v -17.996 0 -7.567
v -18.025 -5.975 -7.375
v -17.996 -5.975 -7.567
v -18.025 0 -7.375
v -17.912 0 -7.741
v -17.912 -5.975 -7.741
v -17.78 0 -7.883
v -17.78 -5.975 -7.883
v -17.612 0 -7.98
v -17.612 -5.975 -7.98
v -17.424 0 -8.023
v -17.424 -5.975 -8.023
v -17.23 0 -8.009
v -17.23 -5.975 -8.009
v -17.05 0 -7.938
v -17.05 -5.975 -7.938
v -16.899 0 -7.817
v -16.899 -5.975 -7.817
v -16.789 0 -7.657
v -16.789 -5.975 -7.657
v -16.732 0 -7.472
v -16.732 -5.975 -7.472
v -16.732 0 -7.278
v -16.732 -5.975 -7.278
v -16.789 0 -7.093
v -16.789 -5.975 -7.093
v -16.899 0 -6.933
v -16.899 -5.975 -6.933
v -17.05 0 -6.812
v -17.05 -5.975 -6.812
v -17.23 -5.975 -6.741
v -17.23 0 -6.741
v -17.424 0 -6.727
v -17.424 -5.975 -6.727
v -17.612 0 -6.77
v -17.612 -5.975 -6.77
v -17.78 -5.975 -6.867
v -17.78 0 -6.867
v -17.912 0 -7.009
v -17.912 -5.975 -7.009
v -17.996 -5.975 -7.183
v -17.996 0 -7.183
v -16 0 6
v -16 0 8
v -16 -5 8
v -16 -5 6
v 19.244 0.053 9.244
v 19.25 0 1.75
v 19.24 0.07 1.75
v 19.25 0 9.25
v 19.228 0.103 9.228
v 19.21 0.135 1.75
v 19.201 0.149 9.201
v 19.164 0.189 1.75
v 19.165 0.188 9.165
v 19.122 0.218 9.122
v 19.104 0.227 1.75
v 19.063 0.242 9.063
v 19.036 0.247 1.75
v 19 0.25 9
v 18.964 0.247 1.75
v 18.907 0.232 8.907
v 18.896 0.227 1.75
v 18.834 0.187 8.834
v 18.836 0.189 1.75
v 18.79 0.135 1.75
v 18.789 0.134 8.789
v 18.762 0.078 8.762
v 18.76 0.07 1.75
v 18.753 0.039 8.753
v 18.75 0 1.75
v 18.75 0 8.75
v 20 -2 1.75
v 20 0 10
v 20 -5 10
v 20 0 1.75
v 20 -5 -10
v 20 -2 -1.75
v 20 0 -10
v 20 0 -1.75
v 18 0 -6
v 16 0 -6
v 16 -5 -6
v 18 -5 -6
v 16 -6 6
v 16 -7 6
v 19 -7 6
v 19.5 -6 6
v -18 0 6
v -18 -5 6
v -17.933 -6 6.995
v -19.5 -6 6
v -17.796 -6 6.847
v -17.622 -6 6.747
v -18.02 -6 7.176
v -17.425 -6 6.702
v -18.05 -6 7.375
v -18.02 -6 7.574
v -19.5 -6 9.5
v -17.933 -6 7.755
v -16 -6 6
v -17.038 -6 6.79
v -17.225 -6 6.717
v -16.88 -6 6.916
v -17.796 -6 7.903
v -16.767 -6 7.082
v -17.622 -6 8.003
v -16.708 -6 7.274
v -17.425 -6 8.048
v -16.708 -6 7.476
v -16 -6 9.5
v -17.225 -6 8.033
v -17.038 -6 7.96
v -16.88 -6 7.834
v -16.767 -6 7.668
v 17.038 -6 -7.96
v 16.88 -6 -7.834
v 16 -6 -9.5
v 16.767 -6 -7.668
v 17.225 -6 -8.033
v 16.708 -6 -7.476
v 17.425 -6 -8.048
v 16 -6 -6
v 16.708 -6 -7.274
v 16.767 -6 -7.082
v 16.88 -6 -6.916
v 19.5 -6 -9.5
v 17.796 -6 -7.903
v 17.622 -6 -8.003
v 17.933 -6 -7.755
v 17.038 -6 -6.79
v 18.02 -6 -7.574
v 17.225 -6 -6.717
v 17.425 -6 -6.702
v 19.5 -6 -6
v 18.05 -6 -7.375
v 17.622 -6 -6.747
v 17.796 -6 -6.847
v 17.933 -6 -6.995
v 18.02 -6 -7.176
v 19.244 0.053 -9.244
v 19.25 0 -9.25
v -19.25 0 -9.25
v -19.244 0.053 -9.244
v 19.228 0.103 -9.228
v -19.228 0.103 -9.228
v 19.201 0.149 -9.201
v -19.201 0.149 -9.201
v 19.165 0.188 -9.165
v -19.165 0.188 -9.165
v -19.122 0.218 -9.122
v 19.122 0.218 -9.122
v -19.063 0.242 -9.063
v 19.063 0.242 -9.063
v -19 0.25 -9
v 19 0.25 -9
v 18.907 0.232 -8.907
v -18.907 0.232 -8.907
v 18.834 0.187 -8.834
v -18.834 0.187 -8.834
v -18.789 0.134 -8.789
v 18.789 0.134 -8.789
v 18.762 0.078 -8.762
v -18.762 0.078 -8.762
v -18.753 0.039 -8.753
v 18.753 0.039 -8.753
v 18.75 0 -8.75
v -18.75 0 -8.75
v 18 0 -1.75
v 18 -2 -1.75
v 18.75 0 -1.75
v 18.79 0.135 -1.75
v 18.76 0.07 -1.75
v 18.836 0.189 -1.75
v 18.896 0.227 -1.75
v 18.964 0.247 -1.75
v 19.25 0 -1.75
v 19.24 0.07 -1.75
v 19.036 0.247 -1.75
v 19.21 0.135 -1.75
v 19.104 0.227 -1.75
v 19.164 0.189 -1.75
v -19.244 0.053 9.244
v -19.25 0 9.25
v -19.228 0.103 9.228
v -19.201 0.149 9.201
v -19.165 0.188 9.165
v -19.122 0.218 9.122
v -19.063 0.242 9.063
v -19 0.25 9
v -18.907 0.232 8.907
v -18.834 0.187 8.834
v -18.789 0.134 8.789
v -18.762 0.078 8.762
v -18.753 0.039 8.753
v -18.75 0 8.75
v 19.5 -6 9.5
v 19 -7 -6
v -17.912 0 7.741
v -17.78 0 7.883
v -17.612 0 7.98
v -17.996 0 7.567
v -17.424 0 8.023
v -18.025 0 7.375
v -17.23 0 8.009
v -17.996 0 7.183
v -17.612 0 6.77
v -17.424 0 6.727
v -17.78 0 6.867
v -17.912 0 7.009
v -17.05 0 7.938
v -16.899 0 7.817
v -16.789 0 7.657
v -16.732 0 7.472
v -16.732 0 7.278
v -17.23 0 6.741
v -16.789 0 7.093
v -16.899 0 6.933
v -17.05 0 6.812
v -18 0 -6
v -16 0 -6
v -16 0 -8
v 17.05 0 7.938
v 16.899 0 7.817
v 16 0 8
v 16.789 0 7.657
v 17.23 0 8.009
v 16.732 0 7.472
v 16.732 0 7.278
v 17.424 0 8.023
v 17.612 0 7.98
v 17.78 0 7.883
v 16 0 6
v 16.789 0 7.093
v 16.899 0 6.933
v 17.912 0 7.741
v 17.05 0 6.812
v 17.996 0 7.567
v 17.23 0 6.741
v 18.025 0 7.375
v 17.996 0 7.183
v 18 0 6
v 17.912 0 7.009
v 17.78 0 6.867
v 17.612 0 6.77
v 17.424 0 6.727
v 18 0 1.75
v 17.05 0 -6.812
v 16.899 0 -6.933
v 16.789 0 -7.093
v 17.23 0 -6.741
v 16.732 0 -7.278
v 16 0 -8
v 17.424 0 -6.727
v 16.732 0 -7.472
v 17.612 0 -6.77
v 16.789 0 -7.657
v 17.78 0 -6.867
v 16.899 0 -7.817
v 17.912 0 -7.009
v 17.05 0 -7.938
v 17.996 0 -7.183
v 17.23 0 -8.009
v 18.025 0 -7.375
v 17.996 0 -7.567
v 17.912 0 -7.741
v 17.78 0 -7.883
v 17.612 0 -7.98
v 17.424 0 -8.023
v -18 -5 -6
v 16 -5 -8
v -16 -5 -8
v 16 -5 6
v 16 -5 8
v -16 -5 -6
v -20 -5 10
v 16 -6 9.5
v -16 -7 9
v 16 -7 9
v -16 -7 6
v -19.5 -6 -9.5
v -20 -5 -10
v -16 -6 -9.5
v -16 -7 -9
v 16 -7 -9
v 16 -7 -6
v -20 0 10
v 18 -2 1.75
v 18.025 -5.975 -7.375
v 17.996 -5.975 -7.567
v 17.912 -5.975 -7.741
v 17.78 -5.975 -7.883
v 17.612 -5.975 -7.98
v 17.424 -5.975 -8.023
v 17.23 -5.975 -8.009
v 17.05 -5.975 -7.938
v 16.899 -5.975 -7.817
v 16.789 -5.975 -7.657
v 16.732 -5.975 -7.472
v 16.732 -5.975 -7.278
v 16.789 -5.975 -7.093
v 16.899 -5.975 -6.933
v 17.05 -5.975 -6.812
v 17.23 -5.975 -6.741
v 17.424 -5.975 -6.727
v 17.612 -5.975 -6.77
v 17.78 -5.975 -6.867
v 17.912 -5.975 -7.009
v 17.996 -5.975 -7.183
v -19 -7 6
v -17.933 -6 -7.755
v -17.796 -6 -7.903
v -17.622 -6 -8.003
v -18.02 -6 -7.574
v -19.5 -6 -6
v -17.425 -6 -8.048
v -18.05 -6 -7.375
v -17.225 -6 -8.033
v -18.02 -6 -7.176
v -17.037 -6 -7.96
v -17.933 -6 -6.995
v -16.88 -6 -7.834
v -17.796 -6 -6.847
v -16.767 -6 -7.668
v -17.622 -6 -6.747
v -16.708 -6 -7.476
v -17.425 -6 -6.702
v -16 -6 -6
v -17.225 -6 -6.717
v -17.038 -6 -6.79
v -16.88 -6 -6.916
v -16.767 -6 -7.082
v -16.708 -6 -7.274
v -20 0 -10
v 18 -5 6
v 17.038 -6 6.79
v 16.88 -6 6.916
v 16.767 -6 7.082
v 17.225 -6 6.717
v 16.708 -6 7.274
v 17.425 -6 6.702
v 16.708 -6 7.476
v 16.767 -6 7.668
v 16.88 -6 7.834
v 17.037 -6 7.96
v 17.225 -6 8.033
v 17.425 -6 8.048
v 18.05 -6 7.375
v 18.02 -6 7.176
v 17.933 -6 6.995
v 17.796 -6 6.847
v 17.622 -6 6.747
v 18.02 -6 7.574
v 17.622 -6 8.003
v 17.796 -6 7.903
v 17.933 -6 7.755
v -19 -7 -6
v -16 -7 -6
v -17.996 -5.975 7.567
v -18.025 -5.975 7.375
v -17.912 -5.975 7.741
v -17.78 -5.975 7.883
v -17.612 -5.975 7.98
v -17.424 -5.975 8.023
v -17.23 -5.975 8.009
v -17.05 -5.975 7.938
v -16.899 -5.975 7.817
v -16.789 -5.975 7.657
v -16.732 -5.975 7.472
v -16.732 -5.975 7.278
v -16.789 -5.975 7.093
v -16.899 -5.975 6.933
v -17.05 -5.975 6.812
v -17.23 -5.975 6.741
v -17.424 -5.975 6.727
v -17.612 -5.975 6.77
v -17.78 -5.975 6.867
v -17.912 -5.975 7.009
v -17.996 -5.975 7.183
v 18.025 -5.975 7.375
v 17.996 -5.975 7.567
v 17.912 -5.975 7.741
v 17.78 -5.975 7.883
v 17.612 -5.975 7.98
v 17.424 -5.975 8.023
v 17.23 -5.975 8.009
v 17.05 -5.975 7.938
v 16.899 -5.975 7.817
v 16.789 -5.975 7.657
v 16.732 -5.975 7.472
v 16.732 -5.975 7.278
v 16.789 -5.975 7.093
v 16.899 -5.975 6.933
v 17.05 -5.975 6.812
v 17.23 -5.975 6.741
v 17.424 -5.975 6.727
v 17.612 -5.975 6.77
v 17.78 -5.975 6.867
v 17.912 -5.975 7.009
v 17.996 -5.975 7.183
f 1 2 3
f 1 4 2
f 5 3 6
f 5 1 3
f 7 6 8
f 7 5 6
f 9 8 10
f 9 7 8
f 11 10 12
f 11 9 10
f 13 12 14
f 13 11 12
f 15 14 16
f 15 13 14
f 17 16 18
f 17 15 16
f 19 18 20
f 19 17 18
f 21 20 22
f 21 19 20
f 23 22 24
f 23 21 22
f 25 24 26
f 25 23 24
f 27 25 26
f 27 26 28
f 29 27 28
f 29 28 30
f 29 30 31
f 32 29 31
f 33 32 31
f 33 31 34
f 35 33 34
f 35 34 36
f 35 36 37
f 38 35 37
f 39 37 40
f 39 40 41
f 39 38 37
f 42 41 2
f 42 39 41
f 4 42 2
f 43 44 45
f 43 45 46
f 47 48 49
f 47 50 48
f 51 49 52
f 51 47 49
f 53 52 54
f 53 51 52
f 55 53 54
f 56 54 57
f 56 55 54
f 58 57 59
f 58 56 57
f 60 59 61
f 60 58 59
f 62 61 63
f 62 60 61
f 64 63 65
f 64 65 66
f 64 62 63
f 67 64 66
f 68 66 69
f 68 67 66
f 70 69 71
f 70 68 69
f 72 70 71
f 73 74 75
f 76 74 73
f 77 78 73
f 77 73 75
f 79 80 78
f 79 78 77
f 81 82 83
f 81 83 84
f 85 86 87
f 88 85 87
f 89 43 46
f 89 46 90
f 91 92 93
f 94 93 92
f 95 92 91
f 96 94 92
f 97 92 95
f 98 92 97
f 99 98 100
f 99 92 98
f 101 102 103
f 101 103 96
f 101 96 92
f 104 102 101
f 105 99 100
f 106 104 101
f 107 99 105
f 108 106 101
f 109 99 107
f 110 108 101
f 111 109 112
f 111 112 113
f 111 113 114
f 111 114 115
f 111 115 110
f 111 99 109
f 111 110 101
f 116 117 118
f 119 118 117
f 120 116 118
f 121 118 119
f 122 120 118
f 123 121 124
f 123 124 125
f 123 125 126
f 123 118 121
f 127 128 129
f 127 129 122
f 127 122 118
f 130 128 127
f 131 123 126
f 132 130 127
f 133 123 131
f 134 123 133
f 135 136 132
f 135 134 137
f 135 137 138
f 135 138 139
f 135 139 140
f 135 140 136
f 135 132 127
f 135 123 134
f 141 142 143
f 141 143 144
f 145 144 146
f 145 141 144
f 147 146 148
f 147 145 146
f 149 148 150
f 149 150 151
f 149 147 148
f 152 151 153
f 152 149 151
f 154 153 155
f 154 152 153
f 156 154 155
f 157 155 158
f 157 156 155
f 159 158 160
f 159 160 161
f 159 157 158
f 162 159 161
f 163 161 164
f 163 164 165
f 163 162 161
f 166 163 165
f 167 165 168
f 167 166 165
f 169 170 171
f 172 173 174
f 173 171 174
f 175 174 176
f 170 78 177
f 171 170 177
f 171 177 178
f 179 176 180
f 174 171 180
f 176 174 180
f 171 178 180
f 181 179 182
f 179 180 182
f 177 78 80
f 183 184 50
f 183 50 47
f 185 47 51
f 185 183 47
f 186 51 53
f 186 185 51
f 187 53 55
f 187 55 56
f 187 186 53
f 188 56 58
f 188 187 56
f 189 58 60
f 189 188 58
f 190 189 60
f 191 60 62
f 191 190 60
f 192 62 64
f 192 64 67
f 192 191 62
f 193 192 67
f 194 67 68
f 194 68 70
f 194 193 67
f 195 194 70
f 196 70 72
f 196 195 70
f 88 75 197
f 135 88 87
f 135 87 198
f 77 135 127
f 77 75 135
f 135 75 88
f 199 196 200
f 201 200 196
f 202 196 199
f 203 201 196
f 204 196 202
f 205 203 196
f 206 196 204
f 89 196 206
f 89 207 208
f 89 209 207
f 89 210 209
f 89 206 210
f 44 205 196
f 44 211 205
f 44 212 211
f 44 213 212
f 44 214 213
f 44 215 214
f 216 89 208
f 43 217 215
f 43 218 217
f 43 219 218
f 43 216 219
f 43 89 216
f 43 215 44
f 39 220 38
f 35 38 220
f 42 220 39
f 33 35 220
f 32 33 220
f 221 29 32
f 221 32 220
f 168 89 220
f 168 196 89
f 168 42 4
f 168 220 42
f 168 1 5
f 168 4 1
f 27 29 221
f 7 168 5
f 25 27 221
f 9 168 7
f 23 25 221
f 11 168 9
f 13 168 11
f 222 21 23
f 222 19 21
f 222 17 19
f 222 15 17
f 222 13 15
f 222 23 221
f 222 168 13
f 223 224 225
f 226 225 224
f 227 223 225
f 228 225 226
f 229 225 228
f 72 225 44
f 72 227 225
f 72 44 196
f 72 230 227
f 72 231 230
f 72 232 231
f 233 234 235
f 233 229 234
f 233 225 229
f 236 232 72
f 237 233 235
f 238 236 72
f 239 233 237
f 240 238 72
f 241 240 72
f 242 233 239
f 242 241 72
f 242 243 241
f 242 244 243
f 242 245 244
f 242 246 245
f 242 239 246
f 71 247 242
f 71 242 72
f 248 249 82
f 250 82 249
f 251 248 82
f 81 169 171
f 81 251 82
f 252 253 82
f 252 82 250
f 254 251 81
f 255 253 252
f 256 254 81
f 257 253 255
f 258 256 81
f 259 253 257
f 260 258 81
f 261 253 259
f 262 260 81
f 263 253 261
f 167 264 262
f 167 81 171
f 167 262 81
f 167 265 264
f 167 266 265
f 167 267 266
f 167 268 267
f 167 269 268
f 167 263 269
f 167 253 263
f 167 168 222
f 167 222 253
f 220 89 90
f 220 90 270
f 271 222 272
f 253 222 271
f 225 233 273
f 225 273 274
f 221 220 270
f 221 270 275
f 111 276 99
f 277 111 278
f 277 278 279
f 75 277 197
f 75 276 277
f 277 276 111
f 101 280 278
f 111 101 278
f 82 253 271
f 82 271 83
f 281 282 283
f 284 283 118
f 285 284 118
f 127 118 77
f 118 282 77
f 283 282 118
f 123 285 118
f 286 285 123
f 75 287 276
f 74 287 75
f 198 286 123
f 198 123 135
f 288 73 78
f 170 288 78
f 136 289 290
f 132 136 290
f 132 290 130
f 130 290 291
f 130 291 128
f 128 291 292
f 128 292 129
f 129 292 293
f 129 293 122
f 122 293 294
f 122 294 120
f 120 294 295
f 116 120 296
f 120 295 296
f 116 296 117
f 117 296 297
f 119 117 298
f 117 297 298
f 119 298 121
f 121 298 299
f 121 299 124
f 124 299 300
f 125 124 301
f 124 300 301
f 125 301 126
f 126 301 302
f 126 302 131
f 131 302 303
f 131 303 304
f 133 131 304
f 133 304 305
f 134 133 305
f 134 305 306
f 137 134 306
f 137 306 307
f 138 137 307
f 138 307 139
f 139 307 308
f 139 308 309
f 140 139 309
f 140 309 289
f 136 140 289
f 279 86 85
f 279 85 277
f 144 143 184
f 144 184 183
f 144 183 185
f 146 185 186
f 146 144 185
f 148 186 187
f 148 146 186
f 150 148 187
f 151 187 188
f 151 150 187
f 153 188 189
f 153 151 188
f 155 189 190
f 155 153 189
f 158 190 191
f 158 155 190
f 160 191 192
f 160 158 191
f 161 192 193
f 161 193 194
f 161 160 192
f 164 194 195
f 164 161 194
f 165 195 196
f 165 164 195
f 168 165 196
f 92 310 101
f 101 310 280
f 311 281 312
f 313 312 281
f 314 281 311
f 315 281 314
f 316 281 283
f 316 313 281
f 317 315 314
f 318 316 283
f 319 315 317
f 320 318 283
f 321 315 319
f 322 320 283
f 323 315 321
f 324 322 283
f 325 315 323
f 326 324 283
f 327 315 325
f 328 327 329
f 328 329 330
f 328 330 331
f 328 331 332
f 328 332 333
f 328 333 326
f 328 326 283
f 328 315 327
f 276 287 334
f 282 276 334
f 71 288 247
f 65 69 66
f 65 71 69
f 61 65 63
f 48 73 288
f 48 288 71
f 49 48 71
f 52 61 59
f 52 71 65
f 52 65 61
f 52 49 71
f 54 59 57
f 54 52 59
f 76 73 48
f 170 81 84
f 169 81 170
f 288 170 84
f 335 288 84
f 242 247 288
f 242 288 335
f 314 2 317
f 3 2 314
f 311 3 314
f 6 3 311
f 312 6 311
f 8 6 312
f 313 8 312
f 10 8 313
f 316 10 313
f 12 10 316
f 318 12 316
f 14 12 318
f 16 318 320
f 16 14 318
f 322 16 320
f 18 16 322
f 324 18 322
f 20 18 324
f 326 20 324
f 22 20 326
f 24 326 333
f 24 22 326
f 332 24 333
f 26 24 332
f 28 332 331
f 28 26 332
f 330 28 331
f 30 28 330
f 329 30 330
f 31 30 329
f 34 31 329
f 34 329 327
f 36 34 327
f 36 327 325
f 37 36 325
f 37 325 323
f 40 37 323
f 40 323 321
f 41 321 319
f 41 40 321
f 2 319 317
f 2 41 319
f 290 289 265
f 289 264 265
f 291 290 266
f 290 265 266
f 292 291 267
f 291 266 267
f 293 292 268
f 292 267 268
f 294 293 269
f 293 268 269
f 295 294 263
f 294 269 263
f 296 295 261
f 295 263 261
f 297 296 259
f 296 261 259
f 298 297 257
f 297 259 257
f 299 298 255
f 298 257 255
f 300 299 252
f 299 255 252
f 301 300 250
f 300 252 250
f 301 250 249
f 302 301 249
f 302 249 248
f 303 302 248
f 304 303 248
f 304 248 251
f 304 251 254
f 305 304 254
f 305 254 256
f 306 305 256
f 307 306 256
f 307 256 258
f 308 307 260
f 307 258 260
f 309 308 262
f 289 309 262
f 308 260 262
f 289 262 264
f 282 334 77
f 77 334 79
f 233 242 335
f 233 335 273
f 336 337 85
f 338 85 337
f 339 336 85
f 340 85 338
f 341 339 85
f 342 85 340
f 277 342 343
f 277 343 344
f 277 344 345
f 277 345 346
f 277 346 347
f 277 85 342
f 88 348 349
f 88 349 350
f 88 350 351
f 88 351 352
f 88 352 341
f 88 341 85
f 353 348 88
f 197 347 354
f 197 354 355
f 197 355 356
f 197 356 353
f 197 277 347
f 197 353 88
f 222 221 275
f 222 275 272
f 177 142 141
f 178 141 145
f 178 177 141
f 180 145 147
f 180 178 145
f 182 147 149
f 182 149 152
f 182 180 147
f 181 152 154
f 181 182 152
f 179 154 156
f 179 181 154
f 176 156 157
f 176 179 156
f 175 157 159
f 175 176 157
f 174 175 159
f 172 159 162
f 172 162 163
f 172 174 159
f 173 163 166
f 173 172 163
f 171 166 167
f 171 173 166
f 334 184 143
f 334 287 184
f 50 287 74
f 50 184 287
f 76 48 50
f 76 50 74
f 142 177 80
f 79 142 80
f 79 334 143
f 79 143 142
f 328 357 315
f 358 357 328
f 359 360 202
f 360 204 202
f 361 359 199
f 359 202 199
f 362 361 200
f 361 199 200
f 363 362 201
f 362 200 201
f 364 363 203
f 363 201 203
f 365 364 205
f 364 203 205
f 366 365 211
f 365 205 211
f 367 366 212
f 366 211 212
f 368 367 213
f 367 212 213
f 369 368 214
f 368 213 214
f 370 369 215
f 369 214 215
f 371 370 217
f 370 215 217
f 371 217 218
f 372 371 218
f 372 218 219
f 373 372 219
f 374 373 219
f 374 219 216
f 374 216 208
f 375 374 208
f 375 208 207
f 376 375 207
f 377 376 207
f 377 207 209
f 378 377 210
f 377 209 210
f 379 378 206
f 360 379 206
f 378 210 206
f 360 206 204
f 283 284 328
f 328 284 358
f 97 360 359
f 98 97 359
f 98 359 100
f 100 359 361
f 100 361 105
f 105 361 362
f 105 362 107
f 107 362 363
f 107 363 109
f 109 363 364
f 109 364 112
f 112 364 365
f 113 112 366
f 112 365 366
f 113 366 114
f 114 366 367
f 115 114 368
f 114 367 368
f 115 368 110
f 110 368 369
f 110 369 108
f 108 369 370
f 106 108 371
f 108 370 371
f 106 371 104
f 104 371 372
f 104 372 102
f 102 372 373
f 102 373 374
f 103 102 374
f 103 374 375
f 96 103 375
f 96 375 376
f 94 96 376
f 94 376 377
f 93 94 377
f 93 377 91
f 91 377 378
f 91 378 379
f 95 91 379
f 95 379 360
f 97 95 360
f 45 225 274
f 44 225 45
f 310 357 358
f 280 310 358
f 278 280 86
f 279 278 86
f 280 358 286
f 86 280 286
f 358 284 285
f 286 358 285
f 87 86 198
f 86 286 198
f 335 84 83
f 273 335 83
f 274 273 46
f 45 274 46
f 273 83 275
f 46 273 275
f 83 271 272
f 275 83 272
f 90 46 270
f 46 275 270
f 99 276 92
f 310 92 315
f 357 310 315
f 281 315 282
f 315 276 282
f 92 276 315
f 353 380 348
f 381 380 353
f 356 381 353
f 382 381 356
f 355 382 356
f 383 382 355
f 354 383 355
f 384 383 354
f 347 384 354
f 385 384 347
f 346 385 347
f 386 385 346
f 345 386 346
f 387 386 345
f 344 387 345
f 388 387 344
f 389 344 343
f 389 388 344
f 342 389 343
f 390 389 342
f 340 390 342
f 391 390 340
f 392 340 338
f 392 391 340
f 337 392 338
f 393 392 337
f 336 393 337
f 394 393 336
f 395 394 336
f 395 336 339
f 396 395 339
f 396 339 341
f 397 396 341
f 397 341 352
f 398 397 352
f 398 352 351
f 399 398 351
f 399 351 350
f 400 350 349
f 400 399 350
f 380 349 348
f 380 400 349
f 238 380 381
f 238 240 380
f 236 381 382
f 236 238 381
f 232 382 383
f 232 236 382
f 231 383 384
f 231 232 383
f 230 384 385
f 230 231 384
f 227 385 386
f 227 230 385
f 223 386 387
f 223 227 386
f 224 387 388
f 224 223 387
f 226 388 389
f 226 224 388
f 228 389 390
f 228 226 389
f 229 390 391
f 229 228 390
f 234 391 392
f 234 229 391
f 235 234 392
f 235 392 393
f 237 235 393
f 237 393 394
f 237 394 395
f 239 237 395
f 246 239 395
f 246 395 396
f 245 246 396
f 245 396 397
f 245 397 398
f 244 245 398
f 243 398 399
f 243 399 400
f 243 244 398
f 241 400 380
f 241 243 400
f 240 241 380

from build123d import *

# Parameters (mm, degrees)
SCHIZZO2_W                     = 40
SCHIZZO2_H                     = 20
ESTRUSIONE_ESTRUSIONE1_DEPTH   = 7
TAGLIO_ESTRUSIONE1_DEPTH       = 5
SMUSSO1_SIZE                   = 1
SMUSSO1_SIZE2                  = 2
SCHIZZO6_W                     = 4
SCHIZZO6_H                     = 4
TAGLIO_ESTRUSIONE2_DEPTH       = 1
FORO_PER_VITE_M1_1_D           = 1.3
FORO_PER_VITE_M1_1_CSINK_D     = 1.35
FORO_PER_VITE_M1_1_CSINK_ANGLE = 90
SPECCHIA2_COPY_1_D             = 1.3
SPECCHIA2_COPY_1_CSINK_D       = 1.35
SPECCHIA2_COPY_1_CSINK_ANGLE   = 90
SCHIZZO14_W                    = 3.5
SCHIZZO14_H                    = 4
TAGLIO_ESTRUSIONE3_DEPTH       = 1
TAGLIO_ESTRUSIONE3_DEPTH_BACK  = 3


with BuildPart() as part:
    # Schizzo2 → Estrusione-Estrusione1 (new body)
    with BuildSketch(Plane(origin=(0, 0, 0), x_dir=(1, 0, 0), z_dir=(0, 1, 0))):
        Rectangle(SCHIZZO2_W, SCHIZZO2_H)
    extrude(amount=-ESTRUSIONE_ESTRUSIONE1_DEPTH)

    # Schizzo3 → Taglio-Estrusione1 (cut)
    with BuildSketch(Plane(origin=(0, 0, 0), x_dir=(1, 0, 0), z_dir=(0, 1, 0))):
        Polygon((-16, 8), (16, 8), (16, 6), (18, 6), (18, -6), (16, -6), (16, -8), (-16, -8), (-16, -6), (-18, -6), (-18, 6), (-16, 6), align=None)
    extrude(amount=-TAGLIO_ESTRUSIONE1_DEPTH, mode=Mode.SUBTRACT)

    # Sweep1: sweep along a path in Schizzo5
    with BuildLine(Plane(origin=(0, 0, 0), x_dir=(1, 0, 0), z_dir=(0, 1, 0))) as sweep1_path:
        Line((19, -9), (-19, -9))
        Line((-19, -9), (-19, 9))
        Line((-19, 9), (19, 9))
        Line((19, 9), (19, -9))
    # Schizzo4 → Sweep1 (sweep)
    with BuildSketch(Plane.XY):
        with BuildLine():
            Line((-18.75, 0), (-19.25, 0))
            ThreePointArc((-19.25, 0), (-19, 0.25), (-18.75, 0))
        make_face()
    sweep(path=sweep1_path.line, transition=Transition.RIGHT)

    # Smusso1
    smusso1_edges = [part.edges().sort_by_distance(p)[0] for p in [
        (20, -7, 0),
        (0, -7, -10),
        (-20, -7, 0),
        (0, -7, 10),
    ]]
    smusso1_side = [part.faces().sort_by_distance(p)[0] for p in [
        (0, -7, 0),
    ]]
    chamfer(smusso1_edges, length=SMUSSO1_SIZE, length2=SMUSSO1_SIZE2, reference=smusso1_side[0])

    # Schizzo6 → Taglio-Estrusione2 (cut)
    with BuildSketch(Plane.XZ.offset(7)):
        with Locations((-18, 8)):
            Rectangle(SCHIZZO6_W, SCHIZZO6_H)
        with Locations((18, 8)):
            Rectangle(SCHIZZO6_W, SCHIZZO6_H)
        with Locations((18, -8)):
            Rectangle(SCHIZZO6_W, SCHIZZO6_H)
        with Locations((-18, -8)):
            Rectangle(SCHIZZO6_W, SCHIZZO6_H)
    extrude(amount=-TAGLIO_ESTRUSIONE2_DEPTH, mode=Mode.SUBTRACT)

    # Foro per Vite M1-1 (through all)
    with Locations(Plane(origin=(0, -6, 0), x_dir=(-1, 0, 0), z_dir=(0, -1, 0))):
        with Locations((-17.375, 7.375)):
            foro_per_vite_m1_1 = CounterSinkHole(FORO_PER_VITE_M1_1_D / 2, FORO_PER_VITE_M1_1_CSINK_D / 2, counter_sink_angle=FORO_PER_VITE_M1_1_CSINK_ANGLE)

    # Specchia1: Foro per Vite M1-1 across plane
    add(foro_per_vite_m1_1.mirror(Plane(origin=(0, 0, 0), x_dir=(0, 0, 1), z_dir=(1, 0, 0))), mode=Mode.SUBTRACT)

    # Specchia2: Foro per Vite M1-1 across plane
    add(foro_per_vite_m1_1.mirror(Plane.XY), mode=Mode.SUBTRACT)

    # Specchia2 copy 1 (through all)
    with Locations(Plane.XZ.offset(6)):
        with Locations((-17.375, 7.375)):
            CounterSinkHole(SPECCHIA2_COPY_1_D / 2, SPECCHIA2_COPY_1_CSINK_D / 2, counter_sink_angle=SPECCHIA2_COPY_1_CSINK_ANGLE)

    # Schizzo14 → Taglio-Estrusione3 (cut, two sides)
    with BuildSketch(Plane(origin=(20, 0, 0), x_dir=(0, 0, -1), z_dir=(1, 0, 0))) as taglio_estrusione3_sk:
        Rectangle(SCHIZZO14_W, SCHIZZO14_H)
    extrude(amount=TAGLIO_ESTRUSIONE3_DEPTH, mode=Mode.SUBTRACT)
    extrude(taglio_estrusione3_sk.sketch, amount=-TAGLIO_ESTRUSIONE3_DEPTH_BACK, mode=Mode.SUBTRACT)


solid = part.part
